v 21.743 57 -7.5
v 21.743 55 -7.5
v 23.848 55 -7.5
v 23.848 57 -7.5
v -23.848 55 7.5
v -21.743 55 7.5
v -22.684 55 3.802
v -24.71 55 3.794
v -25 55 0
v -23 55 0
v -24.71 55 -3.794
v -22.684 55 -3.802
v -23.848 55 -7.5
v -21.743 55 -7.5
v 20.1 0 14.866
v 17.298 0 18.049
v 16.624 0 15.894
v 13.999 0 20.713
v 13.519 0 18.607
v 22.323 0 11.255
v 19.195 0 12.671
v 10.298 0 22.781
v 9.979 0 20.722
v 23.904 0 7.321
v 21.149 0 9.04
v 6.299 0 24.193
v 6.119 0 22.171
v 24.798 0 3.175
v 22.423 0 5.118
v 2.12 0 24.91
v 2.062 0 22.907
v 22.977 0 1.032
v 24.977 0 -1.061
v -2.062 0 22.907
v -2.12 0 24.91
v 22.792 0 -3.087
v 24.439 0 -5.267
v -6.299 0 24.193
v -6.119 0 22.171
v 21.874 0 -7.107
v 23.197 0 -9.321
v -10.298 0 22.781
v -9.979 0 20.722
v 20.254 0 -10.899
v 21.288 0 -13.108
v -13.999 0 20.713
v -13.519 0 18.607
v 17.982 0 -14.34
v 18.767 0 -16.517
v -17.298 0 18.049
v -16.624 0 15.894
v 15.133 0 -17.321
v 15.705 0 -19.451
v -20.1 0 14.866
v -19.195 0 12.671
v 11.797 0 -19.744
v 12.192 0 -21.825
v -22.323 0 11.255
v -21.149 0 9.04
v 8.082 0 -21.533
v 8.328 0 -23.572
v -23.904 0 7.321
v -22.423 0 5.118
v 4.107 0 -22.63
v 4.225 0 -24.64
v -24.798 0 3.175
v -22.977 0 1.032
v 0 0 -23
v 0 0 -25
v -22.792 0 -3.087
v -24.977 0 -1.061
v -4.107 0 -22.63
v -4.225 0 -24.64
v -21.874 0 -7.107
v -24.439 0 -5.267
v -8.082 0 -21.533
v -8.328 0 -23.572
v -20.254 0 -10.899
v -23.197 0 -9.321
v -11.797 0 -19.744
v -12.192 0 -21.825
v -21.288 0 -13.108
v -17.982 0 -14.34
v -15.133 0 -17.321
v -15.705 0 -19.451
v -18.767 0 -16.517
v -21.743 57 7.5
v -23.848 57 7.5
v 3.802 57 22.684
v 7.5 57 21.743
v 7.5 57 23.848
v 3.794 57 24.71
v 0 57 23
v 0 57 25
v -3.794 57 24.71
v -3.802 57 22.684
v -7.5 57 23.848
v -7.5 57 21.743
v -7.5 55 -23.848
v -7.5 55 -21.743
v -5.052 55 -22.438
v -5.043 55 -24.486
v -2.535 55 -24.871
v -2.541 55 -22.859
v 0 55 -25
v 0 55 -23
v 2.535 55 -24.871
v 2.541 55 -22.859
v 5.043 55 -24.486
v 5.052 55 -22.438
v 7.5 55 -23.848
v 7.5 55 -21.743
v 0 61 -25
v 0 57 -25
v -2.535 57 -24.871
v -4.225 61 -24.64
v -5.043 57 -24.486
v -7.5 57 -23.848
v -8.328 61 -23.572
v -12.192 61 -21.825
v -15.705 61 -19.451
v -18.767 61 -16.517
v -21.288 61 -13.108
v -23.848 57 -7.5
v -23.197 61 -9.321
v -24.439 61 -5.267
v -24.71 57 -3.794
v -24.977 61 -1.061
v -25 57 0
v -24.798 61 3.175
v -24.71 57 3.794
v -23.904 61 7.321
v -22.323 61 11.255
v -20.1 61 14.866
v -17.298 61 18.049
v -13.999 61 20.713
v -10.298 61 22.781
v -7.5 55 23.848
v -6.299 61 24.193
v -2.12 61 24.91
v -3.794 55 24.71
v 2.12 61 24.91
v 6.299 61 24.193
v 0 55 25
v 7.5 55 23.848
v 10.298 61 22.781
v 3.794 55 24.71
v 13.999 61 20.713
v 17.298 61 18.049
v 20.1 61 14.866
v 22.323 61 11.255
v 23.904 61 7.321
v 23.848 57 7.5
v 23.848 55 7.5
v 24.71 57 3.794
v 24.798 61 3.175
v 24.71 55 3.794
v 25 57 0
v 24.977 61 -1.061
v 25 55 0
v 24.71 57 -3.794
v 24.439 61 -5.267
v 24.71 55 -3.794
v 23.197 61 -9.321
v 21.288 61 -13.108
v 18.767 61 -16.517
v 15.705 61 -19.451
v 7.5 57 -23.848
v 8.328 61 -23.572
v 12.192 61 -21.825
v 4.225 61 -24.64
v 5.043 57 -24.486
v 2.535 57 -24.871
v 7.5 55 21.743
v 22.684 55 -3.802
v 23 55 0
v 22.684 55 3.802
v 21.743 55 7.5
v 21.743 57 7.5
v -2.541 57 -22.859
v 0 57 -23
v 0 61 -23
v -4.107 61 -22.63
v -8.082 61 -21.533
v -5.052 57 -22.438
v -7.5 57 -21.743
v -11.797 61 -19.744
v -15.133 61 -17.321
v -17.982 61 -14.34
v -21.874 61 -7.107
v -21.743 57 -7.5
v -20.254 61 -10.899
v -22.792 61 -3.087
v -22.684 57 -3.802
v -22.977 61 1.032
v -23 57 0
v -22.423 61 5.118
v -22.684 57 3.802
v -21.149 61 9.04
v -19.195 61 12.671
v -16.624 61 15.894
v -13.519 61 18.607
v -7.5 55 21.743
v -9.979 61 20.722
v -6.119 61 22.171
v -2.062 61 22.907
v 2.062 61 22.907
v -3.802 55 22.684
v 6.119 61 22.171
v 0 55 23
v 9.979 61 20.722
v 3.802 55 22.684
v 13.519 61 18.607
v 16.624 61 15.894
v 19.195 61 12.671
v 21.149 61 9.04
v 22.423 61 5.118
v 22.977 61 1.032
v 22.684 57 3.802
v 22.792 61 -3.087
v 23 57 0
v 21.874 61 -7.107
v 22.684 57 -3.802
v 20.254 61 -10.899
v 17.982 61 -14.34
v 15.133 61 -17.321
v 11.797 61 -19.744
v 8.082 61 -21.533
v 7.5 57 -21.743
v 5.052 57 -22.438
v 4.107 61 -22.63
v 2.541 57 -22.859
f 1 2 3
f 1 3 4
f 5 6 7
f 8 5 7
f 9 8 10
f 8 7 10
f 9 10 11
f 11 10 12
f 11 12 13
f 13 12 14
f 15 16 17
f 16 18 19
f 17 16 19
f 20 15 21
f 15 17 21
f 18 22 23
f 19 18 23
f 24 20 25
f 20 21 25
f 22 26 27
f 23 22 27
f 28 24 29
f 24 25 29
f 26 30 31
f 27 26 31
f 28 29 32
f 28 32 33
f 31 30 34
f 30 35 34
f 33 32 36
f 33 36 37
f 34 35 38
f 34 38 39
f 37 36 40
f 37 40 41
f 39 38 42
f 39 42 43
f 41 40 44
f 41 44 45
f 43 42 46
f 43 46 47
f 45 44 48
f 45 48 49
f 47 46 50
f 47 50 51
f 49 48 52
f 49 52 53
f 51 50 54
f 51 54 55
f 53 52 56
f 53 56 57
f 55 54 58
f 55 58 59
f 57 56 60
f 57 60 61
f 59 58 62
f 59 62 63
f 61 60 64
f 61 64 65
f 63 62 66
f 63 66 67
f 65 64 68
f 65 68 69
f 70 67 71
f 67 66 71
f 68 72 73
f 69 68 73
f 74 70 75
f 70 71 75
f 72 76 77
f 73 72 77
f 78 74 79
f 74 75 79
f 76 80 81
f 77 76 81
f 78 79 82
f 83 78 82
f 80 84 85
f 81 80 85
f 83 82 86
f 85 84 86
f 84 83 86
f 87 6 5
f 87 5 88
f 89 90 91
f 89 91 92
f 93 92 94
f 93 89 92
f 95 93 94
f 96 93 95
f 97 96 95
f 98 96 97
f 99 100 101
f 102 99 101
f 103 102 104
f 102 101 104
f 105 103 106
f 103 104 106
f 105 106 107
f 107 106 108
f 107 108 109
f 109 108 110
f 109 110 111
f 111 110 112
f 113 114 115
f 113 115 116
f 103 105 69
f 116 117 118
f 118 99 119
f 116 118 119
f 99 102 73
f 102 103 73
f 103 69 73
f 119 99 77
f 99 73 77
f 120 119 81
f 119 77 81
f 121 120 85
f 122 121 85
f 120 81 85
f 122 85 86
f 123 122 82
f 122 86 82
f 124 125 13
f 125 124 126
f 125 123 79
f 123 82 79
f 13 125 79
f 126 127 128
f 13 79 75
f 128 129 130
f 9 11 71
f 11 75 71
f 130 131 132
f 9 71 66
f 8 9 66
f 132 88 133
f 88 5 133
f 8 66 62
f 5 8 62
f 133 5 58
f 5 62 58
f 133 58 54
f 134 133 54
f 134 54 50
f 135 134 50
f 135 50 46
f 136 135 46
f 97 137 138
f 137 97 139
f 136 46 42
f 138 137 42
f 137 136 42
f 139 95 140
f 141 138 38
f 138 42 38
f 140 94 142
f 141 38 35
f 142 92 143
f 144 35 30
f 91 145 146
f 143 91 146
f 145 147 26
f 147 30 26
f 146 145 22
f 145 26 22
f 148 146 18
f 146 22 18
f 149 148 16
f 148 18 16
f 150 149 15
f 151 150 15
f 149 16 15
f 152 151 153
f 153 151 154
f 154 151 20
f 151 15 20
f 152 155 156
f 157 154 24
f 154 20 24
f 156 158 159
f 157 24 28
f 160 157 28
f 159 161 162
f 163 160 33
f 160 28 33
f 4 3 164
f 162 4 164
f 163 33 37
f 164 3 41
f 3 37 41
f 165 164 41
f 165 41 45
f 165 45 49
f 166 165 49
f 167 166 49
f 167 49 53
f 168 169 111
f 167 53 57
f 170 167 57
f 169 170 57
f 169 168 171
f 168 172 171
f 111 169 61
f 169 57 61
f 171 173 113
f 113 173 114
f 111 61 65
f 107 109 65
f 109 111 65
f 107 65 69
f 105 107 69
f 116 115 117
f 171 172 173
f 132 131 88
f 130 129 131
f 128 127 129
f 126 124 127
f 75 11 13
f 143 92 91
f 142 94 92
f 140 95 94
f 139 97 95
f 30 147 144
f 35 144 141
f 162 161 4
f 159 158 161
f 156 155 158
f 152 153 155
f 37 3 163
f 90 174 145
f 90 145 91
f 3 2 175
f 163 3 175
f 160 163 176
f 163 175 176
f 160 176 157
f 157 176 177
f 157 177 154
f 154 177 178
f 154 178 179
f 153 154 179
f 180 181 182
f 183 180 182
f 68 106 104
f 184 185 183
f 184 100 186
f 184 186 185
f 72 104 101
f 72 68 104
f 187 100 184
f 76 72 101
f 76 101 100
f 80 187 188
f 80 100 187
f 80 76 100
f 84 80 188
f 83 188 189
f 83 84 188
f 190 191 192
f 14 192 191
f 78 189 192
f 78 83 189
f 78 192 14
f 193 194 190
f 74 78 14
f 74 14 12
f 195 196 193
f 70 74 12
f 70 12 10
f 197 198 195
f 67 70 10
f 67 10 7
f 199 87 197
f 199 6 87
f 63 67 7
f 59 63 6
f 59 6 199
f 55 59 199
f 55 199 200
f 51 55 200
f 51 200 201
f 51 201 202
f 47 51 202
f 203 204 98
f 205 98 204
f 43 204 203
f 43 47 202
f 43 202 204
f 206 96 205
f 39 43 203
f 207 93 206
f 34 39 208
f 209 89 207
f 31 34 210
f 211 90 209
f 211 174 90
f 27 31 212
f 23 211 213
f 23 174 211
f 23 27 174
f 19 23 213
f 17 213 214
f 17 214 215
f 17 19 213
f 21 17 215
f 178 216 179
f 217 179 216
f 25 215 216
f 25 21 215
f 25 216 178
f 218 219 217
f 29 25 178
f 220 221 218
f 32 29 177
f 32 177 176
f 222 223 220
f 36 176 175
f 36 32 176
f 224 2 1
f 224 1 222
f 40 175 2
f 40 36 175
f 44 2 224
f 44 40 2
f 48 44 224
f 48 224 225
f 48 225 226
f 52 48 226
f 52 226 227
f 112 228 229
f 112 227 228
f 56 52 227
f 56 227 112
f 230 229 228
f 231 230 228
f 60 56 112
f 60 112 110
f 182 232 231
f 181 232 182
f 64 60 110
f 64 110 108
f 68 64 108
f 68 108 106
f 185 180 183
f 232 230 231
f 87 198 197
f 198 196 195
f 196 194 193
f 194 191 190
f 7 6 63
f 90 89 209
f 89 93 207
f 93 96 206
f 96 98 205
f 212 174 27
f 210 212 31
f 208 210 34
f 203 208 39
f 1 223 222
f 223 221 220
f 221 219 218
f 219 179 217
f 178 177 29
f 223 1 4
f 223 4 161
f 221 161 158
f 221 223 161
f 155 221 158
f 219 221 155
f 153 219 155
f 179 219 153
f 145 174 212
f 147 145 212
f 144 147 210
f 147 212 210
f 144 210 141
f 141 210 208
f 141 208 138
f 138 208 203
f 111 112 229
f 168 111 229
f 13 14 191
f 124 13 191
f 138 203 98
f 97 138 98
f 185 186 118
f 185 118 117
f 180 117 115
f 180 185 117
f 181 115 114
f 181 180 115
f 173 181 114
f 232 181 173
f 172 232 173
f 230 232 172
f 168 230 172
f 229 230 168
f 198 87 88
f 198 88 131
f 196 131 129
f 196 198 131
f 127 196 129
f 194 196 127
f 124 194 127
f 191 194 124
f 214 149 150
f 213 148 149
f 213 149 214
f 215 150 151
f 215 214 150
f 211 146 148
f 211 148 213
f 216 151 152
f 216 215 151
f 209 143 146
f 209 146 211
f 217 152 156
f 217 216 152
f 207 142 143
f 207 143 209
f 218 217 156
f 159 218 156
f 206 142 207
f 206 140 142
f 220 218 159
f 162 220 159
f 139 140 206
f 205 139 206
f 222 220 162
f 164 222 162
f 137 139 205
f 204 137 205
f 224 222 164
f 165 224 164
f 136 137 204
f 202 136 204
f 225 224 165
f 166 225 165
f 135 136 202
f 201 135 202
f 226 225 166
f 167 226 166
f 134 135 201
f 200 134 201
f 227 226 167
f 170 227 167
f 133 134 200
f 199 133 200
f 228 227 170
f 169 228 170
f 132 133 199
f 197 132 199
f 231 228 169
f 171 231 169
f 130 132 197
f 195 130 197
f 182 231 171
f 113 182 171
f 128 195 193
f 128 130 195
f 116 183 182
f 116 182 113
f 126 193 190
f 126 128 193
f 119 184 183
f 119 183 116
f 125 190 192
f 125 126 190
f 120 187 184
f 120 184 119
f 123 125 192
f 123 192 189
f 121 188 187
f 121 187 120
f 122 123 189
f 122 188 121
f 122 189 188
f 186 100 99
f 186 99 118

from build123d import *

# Parameters (mm, degrees)
SKETCH1_R           = 25
SKETCH1_R_2         = 23
BOSS_EXTRUDE1_DEPTH = 61
SKETCH2_W           = 15
SKETCH2_H           = 2
CUT_EXTRUDE2_DEPTH  = 26
CIRPATTERN1_COUNT   = 4


with BuildPart() as part:
    # Sketch1 → Boss-Extrude1 (new body)
    with BuildSketch(Plane(origin=(0, 0, 0), x_dir=(1, 0, 0), z_dir=(0, 1, 0))):
        with Locations(Location((0, 0, 0), (0, 0, 90))):
            Circle(SKETCH1_R)
        with Locations(Location((0, 0, 0), (0, 0, 90))):
            Circle(SKETCH1_R_2, mode=Mode.SUBTRACT)
    extrude(amount=BOSS_EXTRUDE1_DEPTH)

    # Sketch2 → Cut-Extrude2 (cut)
    with BuildSketch(Plane.XY):
        with Locations((0, 56)):
            Rectangle(SKETCH2_W, SKETCH2_H)
    cut_extrude2 = extrude(amount=-CUT_EXTRUDE2_DEPTH, mode=Mode.SUBTRACT)

    # CirPattern1: Cut-Extrude2 ×4 about axis
    cirpattern1_axis = Axis((0, 0, 0), (0, 1, 0))
    for i in range(1, CIRPATTERN1_COUNT):
        add(cut_extrude2.rotate(cirpattern1_axis, i * 360 / CIRPATTERN1_COUNT), mode=Mode.SUBTRACT)


solid = part.part
